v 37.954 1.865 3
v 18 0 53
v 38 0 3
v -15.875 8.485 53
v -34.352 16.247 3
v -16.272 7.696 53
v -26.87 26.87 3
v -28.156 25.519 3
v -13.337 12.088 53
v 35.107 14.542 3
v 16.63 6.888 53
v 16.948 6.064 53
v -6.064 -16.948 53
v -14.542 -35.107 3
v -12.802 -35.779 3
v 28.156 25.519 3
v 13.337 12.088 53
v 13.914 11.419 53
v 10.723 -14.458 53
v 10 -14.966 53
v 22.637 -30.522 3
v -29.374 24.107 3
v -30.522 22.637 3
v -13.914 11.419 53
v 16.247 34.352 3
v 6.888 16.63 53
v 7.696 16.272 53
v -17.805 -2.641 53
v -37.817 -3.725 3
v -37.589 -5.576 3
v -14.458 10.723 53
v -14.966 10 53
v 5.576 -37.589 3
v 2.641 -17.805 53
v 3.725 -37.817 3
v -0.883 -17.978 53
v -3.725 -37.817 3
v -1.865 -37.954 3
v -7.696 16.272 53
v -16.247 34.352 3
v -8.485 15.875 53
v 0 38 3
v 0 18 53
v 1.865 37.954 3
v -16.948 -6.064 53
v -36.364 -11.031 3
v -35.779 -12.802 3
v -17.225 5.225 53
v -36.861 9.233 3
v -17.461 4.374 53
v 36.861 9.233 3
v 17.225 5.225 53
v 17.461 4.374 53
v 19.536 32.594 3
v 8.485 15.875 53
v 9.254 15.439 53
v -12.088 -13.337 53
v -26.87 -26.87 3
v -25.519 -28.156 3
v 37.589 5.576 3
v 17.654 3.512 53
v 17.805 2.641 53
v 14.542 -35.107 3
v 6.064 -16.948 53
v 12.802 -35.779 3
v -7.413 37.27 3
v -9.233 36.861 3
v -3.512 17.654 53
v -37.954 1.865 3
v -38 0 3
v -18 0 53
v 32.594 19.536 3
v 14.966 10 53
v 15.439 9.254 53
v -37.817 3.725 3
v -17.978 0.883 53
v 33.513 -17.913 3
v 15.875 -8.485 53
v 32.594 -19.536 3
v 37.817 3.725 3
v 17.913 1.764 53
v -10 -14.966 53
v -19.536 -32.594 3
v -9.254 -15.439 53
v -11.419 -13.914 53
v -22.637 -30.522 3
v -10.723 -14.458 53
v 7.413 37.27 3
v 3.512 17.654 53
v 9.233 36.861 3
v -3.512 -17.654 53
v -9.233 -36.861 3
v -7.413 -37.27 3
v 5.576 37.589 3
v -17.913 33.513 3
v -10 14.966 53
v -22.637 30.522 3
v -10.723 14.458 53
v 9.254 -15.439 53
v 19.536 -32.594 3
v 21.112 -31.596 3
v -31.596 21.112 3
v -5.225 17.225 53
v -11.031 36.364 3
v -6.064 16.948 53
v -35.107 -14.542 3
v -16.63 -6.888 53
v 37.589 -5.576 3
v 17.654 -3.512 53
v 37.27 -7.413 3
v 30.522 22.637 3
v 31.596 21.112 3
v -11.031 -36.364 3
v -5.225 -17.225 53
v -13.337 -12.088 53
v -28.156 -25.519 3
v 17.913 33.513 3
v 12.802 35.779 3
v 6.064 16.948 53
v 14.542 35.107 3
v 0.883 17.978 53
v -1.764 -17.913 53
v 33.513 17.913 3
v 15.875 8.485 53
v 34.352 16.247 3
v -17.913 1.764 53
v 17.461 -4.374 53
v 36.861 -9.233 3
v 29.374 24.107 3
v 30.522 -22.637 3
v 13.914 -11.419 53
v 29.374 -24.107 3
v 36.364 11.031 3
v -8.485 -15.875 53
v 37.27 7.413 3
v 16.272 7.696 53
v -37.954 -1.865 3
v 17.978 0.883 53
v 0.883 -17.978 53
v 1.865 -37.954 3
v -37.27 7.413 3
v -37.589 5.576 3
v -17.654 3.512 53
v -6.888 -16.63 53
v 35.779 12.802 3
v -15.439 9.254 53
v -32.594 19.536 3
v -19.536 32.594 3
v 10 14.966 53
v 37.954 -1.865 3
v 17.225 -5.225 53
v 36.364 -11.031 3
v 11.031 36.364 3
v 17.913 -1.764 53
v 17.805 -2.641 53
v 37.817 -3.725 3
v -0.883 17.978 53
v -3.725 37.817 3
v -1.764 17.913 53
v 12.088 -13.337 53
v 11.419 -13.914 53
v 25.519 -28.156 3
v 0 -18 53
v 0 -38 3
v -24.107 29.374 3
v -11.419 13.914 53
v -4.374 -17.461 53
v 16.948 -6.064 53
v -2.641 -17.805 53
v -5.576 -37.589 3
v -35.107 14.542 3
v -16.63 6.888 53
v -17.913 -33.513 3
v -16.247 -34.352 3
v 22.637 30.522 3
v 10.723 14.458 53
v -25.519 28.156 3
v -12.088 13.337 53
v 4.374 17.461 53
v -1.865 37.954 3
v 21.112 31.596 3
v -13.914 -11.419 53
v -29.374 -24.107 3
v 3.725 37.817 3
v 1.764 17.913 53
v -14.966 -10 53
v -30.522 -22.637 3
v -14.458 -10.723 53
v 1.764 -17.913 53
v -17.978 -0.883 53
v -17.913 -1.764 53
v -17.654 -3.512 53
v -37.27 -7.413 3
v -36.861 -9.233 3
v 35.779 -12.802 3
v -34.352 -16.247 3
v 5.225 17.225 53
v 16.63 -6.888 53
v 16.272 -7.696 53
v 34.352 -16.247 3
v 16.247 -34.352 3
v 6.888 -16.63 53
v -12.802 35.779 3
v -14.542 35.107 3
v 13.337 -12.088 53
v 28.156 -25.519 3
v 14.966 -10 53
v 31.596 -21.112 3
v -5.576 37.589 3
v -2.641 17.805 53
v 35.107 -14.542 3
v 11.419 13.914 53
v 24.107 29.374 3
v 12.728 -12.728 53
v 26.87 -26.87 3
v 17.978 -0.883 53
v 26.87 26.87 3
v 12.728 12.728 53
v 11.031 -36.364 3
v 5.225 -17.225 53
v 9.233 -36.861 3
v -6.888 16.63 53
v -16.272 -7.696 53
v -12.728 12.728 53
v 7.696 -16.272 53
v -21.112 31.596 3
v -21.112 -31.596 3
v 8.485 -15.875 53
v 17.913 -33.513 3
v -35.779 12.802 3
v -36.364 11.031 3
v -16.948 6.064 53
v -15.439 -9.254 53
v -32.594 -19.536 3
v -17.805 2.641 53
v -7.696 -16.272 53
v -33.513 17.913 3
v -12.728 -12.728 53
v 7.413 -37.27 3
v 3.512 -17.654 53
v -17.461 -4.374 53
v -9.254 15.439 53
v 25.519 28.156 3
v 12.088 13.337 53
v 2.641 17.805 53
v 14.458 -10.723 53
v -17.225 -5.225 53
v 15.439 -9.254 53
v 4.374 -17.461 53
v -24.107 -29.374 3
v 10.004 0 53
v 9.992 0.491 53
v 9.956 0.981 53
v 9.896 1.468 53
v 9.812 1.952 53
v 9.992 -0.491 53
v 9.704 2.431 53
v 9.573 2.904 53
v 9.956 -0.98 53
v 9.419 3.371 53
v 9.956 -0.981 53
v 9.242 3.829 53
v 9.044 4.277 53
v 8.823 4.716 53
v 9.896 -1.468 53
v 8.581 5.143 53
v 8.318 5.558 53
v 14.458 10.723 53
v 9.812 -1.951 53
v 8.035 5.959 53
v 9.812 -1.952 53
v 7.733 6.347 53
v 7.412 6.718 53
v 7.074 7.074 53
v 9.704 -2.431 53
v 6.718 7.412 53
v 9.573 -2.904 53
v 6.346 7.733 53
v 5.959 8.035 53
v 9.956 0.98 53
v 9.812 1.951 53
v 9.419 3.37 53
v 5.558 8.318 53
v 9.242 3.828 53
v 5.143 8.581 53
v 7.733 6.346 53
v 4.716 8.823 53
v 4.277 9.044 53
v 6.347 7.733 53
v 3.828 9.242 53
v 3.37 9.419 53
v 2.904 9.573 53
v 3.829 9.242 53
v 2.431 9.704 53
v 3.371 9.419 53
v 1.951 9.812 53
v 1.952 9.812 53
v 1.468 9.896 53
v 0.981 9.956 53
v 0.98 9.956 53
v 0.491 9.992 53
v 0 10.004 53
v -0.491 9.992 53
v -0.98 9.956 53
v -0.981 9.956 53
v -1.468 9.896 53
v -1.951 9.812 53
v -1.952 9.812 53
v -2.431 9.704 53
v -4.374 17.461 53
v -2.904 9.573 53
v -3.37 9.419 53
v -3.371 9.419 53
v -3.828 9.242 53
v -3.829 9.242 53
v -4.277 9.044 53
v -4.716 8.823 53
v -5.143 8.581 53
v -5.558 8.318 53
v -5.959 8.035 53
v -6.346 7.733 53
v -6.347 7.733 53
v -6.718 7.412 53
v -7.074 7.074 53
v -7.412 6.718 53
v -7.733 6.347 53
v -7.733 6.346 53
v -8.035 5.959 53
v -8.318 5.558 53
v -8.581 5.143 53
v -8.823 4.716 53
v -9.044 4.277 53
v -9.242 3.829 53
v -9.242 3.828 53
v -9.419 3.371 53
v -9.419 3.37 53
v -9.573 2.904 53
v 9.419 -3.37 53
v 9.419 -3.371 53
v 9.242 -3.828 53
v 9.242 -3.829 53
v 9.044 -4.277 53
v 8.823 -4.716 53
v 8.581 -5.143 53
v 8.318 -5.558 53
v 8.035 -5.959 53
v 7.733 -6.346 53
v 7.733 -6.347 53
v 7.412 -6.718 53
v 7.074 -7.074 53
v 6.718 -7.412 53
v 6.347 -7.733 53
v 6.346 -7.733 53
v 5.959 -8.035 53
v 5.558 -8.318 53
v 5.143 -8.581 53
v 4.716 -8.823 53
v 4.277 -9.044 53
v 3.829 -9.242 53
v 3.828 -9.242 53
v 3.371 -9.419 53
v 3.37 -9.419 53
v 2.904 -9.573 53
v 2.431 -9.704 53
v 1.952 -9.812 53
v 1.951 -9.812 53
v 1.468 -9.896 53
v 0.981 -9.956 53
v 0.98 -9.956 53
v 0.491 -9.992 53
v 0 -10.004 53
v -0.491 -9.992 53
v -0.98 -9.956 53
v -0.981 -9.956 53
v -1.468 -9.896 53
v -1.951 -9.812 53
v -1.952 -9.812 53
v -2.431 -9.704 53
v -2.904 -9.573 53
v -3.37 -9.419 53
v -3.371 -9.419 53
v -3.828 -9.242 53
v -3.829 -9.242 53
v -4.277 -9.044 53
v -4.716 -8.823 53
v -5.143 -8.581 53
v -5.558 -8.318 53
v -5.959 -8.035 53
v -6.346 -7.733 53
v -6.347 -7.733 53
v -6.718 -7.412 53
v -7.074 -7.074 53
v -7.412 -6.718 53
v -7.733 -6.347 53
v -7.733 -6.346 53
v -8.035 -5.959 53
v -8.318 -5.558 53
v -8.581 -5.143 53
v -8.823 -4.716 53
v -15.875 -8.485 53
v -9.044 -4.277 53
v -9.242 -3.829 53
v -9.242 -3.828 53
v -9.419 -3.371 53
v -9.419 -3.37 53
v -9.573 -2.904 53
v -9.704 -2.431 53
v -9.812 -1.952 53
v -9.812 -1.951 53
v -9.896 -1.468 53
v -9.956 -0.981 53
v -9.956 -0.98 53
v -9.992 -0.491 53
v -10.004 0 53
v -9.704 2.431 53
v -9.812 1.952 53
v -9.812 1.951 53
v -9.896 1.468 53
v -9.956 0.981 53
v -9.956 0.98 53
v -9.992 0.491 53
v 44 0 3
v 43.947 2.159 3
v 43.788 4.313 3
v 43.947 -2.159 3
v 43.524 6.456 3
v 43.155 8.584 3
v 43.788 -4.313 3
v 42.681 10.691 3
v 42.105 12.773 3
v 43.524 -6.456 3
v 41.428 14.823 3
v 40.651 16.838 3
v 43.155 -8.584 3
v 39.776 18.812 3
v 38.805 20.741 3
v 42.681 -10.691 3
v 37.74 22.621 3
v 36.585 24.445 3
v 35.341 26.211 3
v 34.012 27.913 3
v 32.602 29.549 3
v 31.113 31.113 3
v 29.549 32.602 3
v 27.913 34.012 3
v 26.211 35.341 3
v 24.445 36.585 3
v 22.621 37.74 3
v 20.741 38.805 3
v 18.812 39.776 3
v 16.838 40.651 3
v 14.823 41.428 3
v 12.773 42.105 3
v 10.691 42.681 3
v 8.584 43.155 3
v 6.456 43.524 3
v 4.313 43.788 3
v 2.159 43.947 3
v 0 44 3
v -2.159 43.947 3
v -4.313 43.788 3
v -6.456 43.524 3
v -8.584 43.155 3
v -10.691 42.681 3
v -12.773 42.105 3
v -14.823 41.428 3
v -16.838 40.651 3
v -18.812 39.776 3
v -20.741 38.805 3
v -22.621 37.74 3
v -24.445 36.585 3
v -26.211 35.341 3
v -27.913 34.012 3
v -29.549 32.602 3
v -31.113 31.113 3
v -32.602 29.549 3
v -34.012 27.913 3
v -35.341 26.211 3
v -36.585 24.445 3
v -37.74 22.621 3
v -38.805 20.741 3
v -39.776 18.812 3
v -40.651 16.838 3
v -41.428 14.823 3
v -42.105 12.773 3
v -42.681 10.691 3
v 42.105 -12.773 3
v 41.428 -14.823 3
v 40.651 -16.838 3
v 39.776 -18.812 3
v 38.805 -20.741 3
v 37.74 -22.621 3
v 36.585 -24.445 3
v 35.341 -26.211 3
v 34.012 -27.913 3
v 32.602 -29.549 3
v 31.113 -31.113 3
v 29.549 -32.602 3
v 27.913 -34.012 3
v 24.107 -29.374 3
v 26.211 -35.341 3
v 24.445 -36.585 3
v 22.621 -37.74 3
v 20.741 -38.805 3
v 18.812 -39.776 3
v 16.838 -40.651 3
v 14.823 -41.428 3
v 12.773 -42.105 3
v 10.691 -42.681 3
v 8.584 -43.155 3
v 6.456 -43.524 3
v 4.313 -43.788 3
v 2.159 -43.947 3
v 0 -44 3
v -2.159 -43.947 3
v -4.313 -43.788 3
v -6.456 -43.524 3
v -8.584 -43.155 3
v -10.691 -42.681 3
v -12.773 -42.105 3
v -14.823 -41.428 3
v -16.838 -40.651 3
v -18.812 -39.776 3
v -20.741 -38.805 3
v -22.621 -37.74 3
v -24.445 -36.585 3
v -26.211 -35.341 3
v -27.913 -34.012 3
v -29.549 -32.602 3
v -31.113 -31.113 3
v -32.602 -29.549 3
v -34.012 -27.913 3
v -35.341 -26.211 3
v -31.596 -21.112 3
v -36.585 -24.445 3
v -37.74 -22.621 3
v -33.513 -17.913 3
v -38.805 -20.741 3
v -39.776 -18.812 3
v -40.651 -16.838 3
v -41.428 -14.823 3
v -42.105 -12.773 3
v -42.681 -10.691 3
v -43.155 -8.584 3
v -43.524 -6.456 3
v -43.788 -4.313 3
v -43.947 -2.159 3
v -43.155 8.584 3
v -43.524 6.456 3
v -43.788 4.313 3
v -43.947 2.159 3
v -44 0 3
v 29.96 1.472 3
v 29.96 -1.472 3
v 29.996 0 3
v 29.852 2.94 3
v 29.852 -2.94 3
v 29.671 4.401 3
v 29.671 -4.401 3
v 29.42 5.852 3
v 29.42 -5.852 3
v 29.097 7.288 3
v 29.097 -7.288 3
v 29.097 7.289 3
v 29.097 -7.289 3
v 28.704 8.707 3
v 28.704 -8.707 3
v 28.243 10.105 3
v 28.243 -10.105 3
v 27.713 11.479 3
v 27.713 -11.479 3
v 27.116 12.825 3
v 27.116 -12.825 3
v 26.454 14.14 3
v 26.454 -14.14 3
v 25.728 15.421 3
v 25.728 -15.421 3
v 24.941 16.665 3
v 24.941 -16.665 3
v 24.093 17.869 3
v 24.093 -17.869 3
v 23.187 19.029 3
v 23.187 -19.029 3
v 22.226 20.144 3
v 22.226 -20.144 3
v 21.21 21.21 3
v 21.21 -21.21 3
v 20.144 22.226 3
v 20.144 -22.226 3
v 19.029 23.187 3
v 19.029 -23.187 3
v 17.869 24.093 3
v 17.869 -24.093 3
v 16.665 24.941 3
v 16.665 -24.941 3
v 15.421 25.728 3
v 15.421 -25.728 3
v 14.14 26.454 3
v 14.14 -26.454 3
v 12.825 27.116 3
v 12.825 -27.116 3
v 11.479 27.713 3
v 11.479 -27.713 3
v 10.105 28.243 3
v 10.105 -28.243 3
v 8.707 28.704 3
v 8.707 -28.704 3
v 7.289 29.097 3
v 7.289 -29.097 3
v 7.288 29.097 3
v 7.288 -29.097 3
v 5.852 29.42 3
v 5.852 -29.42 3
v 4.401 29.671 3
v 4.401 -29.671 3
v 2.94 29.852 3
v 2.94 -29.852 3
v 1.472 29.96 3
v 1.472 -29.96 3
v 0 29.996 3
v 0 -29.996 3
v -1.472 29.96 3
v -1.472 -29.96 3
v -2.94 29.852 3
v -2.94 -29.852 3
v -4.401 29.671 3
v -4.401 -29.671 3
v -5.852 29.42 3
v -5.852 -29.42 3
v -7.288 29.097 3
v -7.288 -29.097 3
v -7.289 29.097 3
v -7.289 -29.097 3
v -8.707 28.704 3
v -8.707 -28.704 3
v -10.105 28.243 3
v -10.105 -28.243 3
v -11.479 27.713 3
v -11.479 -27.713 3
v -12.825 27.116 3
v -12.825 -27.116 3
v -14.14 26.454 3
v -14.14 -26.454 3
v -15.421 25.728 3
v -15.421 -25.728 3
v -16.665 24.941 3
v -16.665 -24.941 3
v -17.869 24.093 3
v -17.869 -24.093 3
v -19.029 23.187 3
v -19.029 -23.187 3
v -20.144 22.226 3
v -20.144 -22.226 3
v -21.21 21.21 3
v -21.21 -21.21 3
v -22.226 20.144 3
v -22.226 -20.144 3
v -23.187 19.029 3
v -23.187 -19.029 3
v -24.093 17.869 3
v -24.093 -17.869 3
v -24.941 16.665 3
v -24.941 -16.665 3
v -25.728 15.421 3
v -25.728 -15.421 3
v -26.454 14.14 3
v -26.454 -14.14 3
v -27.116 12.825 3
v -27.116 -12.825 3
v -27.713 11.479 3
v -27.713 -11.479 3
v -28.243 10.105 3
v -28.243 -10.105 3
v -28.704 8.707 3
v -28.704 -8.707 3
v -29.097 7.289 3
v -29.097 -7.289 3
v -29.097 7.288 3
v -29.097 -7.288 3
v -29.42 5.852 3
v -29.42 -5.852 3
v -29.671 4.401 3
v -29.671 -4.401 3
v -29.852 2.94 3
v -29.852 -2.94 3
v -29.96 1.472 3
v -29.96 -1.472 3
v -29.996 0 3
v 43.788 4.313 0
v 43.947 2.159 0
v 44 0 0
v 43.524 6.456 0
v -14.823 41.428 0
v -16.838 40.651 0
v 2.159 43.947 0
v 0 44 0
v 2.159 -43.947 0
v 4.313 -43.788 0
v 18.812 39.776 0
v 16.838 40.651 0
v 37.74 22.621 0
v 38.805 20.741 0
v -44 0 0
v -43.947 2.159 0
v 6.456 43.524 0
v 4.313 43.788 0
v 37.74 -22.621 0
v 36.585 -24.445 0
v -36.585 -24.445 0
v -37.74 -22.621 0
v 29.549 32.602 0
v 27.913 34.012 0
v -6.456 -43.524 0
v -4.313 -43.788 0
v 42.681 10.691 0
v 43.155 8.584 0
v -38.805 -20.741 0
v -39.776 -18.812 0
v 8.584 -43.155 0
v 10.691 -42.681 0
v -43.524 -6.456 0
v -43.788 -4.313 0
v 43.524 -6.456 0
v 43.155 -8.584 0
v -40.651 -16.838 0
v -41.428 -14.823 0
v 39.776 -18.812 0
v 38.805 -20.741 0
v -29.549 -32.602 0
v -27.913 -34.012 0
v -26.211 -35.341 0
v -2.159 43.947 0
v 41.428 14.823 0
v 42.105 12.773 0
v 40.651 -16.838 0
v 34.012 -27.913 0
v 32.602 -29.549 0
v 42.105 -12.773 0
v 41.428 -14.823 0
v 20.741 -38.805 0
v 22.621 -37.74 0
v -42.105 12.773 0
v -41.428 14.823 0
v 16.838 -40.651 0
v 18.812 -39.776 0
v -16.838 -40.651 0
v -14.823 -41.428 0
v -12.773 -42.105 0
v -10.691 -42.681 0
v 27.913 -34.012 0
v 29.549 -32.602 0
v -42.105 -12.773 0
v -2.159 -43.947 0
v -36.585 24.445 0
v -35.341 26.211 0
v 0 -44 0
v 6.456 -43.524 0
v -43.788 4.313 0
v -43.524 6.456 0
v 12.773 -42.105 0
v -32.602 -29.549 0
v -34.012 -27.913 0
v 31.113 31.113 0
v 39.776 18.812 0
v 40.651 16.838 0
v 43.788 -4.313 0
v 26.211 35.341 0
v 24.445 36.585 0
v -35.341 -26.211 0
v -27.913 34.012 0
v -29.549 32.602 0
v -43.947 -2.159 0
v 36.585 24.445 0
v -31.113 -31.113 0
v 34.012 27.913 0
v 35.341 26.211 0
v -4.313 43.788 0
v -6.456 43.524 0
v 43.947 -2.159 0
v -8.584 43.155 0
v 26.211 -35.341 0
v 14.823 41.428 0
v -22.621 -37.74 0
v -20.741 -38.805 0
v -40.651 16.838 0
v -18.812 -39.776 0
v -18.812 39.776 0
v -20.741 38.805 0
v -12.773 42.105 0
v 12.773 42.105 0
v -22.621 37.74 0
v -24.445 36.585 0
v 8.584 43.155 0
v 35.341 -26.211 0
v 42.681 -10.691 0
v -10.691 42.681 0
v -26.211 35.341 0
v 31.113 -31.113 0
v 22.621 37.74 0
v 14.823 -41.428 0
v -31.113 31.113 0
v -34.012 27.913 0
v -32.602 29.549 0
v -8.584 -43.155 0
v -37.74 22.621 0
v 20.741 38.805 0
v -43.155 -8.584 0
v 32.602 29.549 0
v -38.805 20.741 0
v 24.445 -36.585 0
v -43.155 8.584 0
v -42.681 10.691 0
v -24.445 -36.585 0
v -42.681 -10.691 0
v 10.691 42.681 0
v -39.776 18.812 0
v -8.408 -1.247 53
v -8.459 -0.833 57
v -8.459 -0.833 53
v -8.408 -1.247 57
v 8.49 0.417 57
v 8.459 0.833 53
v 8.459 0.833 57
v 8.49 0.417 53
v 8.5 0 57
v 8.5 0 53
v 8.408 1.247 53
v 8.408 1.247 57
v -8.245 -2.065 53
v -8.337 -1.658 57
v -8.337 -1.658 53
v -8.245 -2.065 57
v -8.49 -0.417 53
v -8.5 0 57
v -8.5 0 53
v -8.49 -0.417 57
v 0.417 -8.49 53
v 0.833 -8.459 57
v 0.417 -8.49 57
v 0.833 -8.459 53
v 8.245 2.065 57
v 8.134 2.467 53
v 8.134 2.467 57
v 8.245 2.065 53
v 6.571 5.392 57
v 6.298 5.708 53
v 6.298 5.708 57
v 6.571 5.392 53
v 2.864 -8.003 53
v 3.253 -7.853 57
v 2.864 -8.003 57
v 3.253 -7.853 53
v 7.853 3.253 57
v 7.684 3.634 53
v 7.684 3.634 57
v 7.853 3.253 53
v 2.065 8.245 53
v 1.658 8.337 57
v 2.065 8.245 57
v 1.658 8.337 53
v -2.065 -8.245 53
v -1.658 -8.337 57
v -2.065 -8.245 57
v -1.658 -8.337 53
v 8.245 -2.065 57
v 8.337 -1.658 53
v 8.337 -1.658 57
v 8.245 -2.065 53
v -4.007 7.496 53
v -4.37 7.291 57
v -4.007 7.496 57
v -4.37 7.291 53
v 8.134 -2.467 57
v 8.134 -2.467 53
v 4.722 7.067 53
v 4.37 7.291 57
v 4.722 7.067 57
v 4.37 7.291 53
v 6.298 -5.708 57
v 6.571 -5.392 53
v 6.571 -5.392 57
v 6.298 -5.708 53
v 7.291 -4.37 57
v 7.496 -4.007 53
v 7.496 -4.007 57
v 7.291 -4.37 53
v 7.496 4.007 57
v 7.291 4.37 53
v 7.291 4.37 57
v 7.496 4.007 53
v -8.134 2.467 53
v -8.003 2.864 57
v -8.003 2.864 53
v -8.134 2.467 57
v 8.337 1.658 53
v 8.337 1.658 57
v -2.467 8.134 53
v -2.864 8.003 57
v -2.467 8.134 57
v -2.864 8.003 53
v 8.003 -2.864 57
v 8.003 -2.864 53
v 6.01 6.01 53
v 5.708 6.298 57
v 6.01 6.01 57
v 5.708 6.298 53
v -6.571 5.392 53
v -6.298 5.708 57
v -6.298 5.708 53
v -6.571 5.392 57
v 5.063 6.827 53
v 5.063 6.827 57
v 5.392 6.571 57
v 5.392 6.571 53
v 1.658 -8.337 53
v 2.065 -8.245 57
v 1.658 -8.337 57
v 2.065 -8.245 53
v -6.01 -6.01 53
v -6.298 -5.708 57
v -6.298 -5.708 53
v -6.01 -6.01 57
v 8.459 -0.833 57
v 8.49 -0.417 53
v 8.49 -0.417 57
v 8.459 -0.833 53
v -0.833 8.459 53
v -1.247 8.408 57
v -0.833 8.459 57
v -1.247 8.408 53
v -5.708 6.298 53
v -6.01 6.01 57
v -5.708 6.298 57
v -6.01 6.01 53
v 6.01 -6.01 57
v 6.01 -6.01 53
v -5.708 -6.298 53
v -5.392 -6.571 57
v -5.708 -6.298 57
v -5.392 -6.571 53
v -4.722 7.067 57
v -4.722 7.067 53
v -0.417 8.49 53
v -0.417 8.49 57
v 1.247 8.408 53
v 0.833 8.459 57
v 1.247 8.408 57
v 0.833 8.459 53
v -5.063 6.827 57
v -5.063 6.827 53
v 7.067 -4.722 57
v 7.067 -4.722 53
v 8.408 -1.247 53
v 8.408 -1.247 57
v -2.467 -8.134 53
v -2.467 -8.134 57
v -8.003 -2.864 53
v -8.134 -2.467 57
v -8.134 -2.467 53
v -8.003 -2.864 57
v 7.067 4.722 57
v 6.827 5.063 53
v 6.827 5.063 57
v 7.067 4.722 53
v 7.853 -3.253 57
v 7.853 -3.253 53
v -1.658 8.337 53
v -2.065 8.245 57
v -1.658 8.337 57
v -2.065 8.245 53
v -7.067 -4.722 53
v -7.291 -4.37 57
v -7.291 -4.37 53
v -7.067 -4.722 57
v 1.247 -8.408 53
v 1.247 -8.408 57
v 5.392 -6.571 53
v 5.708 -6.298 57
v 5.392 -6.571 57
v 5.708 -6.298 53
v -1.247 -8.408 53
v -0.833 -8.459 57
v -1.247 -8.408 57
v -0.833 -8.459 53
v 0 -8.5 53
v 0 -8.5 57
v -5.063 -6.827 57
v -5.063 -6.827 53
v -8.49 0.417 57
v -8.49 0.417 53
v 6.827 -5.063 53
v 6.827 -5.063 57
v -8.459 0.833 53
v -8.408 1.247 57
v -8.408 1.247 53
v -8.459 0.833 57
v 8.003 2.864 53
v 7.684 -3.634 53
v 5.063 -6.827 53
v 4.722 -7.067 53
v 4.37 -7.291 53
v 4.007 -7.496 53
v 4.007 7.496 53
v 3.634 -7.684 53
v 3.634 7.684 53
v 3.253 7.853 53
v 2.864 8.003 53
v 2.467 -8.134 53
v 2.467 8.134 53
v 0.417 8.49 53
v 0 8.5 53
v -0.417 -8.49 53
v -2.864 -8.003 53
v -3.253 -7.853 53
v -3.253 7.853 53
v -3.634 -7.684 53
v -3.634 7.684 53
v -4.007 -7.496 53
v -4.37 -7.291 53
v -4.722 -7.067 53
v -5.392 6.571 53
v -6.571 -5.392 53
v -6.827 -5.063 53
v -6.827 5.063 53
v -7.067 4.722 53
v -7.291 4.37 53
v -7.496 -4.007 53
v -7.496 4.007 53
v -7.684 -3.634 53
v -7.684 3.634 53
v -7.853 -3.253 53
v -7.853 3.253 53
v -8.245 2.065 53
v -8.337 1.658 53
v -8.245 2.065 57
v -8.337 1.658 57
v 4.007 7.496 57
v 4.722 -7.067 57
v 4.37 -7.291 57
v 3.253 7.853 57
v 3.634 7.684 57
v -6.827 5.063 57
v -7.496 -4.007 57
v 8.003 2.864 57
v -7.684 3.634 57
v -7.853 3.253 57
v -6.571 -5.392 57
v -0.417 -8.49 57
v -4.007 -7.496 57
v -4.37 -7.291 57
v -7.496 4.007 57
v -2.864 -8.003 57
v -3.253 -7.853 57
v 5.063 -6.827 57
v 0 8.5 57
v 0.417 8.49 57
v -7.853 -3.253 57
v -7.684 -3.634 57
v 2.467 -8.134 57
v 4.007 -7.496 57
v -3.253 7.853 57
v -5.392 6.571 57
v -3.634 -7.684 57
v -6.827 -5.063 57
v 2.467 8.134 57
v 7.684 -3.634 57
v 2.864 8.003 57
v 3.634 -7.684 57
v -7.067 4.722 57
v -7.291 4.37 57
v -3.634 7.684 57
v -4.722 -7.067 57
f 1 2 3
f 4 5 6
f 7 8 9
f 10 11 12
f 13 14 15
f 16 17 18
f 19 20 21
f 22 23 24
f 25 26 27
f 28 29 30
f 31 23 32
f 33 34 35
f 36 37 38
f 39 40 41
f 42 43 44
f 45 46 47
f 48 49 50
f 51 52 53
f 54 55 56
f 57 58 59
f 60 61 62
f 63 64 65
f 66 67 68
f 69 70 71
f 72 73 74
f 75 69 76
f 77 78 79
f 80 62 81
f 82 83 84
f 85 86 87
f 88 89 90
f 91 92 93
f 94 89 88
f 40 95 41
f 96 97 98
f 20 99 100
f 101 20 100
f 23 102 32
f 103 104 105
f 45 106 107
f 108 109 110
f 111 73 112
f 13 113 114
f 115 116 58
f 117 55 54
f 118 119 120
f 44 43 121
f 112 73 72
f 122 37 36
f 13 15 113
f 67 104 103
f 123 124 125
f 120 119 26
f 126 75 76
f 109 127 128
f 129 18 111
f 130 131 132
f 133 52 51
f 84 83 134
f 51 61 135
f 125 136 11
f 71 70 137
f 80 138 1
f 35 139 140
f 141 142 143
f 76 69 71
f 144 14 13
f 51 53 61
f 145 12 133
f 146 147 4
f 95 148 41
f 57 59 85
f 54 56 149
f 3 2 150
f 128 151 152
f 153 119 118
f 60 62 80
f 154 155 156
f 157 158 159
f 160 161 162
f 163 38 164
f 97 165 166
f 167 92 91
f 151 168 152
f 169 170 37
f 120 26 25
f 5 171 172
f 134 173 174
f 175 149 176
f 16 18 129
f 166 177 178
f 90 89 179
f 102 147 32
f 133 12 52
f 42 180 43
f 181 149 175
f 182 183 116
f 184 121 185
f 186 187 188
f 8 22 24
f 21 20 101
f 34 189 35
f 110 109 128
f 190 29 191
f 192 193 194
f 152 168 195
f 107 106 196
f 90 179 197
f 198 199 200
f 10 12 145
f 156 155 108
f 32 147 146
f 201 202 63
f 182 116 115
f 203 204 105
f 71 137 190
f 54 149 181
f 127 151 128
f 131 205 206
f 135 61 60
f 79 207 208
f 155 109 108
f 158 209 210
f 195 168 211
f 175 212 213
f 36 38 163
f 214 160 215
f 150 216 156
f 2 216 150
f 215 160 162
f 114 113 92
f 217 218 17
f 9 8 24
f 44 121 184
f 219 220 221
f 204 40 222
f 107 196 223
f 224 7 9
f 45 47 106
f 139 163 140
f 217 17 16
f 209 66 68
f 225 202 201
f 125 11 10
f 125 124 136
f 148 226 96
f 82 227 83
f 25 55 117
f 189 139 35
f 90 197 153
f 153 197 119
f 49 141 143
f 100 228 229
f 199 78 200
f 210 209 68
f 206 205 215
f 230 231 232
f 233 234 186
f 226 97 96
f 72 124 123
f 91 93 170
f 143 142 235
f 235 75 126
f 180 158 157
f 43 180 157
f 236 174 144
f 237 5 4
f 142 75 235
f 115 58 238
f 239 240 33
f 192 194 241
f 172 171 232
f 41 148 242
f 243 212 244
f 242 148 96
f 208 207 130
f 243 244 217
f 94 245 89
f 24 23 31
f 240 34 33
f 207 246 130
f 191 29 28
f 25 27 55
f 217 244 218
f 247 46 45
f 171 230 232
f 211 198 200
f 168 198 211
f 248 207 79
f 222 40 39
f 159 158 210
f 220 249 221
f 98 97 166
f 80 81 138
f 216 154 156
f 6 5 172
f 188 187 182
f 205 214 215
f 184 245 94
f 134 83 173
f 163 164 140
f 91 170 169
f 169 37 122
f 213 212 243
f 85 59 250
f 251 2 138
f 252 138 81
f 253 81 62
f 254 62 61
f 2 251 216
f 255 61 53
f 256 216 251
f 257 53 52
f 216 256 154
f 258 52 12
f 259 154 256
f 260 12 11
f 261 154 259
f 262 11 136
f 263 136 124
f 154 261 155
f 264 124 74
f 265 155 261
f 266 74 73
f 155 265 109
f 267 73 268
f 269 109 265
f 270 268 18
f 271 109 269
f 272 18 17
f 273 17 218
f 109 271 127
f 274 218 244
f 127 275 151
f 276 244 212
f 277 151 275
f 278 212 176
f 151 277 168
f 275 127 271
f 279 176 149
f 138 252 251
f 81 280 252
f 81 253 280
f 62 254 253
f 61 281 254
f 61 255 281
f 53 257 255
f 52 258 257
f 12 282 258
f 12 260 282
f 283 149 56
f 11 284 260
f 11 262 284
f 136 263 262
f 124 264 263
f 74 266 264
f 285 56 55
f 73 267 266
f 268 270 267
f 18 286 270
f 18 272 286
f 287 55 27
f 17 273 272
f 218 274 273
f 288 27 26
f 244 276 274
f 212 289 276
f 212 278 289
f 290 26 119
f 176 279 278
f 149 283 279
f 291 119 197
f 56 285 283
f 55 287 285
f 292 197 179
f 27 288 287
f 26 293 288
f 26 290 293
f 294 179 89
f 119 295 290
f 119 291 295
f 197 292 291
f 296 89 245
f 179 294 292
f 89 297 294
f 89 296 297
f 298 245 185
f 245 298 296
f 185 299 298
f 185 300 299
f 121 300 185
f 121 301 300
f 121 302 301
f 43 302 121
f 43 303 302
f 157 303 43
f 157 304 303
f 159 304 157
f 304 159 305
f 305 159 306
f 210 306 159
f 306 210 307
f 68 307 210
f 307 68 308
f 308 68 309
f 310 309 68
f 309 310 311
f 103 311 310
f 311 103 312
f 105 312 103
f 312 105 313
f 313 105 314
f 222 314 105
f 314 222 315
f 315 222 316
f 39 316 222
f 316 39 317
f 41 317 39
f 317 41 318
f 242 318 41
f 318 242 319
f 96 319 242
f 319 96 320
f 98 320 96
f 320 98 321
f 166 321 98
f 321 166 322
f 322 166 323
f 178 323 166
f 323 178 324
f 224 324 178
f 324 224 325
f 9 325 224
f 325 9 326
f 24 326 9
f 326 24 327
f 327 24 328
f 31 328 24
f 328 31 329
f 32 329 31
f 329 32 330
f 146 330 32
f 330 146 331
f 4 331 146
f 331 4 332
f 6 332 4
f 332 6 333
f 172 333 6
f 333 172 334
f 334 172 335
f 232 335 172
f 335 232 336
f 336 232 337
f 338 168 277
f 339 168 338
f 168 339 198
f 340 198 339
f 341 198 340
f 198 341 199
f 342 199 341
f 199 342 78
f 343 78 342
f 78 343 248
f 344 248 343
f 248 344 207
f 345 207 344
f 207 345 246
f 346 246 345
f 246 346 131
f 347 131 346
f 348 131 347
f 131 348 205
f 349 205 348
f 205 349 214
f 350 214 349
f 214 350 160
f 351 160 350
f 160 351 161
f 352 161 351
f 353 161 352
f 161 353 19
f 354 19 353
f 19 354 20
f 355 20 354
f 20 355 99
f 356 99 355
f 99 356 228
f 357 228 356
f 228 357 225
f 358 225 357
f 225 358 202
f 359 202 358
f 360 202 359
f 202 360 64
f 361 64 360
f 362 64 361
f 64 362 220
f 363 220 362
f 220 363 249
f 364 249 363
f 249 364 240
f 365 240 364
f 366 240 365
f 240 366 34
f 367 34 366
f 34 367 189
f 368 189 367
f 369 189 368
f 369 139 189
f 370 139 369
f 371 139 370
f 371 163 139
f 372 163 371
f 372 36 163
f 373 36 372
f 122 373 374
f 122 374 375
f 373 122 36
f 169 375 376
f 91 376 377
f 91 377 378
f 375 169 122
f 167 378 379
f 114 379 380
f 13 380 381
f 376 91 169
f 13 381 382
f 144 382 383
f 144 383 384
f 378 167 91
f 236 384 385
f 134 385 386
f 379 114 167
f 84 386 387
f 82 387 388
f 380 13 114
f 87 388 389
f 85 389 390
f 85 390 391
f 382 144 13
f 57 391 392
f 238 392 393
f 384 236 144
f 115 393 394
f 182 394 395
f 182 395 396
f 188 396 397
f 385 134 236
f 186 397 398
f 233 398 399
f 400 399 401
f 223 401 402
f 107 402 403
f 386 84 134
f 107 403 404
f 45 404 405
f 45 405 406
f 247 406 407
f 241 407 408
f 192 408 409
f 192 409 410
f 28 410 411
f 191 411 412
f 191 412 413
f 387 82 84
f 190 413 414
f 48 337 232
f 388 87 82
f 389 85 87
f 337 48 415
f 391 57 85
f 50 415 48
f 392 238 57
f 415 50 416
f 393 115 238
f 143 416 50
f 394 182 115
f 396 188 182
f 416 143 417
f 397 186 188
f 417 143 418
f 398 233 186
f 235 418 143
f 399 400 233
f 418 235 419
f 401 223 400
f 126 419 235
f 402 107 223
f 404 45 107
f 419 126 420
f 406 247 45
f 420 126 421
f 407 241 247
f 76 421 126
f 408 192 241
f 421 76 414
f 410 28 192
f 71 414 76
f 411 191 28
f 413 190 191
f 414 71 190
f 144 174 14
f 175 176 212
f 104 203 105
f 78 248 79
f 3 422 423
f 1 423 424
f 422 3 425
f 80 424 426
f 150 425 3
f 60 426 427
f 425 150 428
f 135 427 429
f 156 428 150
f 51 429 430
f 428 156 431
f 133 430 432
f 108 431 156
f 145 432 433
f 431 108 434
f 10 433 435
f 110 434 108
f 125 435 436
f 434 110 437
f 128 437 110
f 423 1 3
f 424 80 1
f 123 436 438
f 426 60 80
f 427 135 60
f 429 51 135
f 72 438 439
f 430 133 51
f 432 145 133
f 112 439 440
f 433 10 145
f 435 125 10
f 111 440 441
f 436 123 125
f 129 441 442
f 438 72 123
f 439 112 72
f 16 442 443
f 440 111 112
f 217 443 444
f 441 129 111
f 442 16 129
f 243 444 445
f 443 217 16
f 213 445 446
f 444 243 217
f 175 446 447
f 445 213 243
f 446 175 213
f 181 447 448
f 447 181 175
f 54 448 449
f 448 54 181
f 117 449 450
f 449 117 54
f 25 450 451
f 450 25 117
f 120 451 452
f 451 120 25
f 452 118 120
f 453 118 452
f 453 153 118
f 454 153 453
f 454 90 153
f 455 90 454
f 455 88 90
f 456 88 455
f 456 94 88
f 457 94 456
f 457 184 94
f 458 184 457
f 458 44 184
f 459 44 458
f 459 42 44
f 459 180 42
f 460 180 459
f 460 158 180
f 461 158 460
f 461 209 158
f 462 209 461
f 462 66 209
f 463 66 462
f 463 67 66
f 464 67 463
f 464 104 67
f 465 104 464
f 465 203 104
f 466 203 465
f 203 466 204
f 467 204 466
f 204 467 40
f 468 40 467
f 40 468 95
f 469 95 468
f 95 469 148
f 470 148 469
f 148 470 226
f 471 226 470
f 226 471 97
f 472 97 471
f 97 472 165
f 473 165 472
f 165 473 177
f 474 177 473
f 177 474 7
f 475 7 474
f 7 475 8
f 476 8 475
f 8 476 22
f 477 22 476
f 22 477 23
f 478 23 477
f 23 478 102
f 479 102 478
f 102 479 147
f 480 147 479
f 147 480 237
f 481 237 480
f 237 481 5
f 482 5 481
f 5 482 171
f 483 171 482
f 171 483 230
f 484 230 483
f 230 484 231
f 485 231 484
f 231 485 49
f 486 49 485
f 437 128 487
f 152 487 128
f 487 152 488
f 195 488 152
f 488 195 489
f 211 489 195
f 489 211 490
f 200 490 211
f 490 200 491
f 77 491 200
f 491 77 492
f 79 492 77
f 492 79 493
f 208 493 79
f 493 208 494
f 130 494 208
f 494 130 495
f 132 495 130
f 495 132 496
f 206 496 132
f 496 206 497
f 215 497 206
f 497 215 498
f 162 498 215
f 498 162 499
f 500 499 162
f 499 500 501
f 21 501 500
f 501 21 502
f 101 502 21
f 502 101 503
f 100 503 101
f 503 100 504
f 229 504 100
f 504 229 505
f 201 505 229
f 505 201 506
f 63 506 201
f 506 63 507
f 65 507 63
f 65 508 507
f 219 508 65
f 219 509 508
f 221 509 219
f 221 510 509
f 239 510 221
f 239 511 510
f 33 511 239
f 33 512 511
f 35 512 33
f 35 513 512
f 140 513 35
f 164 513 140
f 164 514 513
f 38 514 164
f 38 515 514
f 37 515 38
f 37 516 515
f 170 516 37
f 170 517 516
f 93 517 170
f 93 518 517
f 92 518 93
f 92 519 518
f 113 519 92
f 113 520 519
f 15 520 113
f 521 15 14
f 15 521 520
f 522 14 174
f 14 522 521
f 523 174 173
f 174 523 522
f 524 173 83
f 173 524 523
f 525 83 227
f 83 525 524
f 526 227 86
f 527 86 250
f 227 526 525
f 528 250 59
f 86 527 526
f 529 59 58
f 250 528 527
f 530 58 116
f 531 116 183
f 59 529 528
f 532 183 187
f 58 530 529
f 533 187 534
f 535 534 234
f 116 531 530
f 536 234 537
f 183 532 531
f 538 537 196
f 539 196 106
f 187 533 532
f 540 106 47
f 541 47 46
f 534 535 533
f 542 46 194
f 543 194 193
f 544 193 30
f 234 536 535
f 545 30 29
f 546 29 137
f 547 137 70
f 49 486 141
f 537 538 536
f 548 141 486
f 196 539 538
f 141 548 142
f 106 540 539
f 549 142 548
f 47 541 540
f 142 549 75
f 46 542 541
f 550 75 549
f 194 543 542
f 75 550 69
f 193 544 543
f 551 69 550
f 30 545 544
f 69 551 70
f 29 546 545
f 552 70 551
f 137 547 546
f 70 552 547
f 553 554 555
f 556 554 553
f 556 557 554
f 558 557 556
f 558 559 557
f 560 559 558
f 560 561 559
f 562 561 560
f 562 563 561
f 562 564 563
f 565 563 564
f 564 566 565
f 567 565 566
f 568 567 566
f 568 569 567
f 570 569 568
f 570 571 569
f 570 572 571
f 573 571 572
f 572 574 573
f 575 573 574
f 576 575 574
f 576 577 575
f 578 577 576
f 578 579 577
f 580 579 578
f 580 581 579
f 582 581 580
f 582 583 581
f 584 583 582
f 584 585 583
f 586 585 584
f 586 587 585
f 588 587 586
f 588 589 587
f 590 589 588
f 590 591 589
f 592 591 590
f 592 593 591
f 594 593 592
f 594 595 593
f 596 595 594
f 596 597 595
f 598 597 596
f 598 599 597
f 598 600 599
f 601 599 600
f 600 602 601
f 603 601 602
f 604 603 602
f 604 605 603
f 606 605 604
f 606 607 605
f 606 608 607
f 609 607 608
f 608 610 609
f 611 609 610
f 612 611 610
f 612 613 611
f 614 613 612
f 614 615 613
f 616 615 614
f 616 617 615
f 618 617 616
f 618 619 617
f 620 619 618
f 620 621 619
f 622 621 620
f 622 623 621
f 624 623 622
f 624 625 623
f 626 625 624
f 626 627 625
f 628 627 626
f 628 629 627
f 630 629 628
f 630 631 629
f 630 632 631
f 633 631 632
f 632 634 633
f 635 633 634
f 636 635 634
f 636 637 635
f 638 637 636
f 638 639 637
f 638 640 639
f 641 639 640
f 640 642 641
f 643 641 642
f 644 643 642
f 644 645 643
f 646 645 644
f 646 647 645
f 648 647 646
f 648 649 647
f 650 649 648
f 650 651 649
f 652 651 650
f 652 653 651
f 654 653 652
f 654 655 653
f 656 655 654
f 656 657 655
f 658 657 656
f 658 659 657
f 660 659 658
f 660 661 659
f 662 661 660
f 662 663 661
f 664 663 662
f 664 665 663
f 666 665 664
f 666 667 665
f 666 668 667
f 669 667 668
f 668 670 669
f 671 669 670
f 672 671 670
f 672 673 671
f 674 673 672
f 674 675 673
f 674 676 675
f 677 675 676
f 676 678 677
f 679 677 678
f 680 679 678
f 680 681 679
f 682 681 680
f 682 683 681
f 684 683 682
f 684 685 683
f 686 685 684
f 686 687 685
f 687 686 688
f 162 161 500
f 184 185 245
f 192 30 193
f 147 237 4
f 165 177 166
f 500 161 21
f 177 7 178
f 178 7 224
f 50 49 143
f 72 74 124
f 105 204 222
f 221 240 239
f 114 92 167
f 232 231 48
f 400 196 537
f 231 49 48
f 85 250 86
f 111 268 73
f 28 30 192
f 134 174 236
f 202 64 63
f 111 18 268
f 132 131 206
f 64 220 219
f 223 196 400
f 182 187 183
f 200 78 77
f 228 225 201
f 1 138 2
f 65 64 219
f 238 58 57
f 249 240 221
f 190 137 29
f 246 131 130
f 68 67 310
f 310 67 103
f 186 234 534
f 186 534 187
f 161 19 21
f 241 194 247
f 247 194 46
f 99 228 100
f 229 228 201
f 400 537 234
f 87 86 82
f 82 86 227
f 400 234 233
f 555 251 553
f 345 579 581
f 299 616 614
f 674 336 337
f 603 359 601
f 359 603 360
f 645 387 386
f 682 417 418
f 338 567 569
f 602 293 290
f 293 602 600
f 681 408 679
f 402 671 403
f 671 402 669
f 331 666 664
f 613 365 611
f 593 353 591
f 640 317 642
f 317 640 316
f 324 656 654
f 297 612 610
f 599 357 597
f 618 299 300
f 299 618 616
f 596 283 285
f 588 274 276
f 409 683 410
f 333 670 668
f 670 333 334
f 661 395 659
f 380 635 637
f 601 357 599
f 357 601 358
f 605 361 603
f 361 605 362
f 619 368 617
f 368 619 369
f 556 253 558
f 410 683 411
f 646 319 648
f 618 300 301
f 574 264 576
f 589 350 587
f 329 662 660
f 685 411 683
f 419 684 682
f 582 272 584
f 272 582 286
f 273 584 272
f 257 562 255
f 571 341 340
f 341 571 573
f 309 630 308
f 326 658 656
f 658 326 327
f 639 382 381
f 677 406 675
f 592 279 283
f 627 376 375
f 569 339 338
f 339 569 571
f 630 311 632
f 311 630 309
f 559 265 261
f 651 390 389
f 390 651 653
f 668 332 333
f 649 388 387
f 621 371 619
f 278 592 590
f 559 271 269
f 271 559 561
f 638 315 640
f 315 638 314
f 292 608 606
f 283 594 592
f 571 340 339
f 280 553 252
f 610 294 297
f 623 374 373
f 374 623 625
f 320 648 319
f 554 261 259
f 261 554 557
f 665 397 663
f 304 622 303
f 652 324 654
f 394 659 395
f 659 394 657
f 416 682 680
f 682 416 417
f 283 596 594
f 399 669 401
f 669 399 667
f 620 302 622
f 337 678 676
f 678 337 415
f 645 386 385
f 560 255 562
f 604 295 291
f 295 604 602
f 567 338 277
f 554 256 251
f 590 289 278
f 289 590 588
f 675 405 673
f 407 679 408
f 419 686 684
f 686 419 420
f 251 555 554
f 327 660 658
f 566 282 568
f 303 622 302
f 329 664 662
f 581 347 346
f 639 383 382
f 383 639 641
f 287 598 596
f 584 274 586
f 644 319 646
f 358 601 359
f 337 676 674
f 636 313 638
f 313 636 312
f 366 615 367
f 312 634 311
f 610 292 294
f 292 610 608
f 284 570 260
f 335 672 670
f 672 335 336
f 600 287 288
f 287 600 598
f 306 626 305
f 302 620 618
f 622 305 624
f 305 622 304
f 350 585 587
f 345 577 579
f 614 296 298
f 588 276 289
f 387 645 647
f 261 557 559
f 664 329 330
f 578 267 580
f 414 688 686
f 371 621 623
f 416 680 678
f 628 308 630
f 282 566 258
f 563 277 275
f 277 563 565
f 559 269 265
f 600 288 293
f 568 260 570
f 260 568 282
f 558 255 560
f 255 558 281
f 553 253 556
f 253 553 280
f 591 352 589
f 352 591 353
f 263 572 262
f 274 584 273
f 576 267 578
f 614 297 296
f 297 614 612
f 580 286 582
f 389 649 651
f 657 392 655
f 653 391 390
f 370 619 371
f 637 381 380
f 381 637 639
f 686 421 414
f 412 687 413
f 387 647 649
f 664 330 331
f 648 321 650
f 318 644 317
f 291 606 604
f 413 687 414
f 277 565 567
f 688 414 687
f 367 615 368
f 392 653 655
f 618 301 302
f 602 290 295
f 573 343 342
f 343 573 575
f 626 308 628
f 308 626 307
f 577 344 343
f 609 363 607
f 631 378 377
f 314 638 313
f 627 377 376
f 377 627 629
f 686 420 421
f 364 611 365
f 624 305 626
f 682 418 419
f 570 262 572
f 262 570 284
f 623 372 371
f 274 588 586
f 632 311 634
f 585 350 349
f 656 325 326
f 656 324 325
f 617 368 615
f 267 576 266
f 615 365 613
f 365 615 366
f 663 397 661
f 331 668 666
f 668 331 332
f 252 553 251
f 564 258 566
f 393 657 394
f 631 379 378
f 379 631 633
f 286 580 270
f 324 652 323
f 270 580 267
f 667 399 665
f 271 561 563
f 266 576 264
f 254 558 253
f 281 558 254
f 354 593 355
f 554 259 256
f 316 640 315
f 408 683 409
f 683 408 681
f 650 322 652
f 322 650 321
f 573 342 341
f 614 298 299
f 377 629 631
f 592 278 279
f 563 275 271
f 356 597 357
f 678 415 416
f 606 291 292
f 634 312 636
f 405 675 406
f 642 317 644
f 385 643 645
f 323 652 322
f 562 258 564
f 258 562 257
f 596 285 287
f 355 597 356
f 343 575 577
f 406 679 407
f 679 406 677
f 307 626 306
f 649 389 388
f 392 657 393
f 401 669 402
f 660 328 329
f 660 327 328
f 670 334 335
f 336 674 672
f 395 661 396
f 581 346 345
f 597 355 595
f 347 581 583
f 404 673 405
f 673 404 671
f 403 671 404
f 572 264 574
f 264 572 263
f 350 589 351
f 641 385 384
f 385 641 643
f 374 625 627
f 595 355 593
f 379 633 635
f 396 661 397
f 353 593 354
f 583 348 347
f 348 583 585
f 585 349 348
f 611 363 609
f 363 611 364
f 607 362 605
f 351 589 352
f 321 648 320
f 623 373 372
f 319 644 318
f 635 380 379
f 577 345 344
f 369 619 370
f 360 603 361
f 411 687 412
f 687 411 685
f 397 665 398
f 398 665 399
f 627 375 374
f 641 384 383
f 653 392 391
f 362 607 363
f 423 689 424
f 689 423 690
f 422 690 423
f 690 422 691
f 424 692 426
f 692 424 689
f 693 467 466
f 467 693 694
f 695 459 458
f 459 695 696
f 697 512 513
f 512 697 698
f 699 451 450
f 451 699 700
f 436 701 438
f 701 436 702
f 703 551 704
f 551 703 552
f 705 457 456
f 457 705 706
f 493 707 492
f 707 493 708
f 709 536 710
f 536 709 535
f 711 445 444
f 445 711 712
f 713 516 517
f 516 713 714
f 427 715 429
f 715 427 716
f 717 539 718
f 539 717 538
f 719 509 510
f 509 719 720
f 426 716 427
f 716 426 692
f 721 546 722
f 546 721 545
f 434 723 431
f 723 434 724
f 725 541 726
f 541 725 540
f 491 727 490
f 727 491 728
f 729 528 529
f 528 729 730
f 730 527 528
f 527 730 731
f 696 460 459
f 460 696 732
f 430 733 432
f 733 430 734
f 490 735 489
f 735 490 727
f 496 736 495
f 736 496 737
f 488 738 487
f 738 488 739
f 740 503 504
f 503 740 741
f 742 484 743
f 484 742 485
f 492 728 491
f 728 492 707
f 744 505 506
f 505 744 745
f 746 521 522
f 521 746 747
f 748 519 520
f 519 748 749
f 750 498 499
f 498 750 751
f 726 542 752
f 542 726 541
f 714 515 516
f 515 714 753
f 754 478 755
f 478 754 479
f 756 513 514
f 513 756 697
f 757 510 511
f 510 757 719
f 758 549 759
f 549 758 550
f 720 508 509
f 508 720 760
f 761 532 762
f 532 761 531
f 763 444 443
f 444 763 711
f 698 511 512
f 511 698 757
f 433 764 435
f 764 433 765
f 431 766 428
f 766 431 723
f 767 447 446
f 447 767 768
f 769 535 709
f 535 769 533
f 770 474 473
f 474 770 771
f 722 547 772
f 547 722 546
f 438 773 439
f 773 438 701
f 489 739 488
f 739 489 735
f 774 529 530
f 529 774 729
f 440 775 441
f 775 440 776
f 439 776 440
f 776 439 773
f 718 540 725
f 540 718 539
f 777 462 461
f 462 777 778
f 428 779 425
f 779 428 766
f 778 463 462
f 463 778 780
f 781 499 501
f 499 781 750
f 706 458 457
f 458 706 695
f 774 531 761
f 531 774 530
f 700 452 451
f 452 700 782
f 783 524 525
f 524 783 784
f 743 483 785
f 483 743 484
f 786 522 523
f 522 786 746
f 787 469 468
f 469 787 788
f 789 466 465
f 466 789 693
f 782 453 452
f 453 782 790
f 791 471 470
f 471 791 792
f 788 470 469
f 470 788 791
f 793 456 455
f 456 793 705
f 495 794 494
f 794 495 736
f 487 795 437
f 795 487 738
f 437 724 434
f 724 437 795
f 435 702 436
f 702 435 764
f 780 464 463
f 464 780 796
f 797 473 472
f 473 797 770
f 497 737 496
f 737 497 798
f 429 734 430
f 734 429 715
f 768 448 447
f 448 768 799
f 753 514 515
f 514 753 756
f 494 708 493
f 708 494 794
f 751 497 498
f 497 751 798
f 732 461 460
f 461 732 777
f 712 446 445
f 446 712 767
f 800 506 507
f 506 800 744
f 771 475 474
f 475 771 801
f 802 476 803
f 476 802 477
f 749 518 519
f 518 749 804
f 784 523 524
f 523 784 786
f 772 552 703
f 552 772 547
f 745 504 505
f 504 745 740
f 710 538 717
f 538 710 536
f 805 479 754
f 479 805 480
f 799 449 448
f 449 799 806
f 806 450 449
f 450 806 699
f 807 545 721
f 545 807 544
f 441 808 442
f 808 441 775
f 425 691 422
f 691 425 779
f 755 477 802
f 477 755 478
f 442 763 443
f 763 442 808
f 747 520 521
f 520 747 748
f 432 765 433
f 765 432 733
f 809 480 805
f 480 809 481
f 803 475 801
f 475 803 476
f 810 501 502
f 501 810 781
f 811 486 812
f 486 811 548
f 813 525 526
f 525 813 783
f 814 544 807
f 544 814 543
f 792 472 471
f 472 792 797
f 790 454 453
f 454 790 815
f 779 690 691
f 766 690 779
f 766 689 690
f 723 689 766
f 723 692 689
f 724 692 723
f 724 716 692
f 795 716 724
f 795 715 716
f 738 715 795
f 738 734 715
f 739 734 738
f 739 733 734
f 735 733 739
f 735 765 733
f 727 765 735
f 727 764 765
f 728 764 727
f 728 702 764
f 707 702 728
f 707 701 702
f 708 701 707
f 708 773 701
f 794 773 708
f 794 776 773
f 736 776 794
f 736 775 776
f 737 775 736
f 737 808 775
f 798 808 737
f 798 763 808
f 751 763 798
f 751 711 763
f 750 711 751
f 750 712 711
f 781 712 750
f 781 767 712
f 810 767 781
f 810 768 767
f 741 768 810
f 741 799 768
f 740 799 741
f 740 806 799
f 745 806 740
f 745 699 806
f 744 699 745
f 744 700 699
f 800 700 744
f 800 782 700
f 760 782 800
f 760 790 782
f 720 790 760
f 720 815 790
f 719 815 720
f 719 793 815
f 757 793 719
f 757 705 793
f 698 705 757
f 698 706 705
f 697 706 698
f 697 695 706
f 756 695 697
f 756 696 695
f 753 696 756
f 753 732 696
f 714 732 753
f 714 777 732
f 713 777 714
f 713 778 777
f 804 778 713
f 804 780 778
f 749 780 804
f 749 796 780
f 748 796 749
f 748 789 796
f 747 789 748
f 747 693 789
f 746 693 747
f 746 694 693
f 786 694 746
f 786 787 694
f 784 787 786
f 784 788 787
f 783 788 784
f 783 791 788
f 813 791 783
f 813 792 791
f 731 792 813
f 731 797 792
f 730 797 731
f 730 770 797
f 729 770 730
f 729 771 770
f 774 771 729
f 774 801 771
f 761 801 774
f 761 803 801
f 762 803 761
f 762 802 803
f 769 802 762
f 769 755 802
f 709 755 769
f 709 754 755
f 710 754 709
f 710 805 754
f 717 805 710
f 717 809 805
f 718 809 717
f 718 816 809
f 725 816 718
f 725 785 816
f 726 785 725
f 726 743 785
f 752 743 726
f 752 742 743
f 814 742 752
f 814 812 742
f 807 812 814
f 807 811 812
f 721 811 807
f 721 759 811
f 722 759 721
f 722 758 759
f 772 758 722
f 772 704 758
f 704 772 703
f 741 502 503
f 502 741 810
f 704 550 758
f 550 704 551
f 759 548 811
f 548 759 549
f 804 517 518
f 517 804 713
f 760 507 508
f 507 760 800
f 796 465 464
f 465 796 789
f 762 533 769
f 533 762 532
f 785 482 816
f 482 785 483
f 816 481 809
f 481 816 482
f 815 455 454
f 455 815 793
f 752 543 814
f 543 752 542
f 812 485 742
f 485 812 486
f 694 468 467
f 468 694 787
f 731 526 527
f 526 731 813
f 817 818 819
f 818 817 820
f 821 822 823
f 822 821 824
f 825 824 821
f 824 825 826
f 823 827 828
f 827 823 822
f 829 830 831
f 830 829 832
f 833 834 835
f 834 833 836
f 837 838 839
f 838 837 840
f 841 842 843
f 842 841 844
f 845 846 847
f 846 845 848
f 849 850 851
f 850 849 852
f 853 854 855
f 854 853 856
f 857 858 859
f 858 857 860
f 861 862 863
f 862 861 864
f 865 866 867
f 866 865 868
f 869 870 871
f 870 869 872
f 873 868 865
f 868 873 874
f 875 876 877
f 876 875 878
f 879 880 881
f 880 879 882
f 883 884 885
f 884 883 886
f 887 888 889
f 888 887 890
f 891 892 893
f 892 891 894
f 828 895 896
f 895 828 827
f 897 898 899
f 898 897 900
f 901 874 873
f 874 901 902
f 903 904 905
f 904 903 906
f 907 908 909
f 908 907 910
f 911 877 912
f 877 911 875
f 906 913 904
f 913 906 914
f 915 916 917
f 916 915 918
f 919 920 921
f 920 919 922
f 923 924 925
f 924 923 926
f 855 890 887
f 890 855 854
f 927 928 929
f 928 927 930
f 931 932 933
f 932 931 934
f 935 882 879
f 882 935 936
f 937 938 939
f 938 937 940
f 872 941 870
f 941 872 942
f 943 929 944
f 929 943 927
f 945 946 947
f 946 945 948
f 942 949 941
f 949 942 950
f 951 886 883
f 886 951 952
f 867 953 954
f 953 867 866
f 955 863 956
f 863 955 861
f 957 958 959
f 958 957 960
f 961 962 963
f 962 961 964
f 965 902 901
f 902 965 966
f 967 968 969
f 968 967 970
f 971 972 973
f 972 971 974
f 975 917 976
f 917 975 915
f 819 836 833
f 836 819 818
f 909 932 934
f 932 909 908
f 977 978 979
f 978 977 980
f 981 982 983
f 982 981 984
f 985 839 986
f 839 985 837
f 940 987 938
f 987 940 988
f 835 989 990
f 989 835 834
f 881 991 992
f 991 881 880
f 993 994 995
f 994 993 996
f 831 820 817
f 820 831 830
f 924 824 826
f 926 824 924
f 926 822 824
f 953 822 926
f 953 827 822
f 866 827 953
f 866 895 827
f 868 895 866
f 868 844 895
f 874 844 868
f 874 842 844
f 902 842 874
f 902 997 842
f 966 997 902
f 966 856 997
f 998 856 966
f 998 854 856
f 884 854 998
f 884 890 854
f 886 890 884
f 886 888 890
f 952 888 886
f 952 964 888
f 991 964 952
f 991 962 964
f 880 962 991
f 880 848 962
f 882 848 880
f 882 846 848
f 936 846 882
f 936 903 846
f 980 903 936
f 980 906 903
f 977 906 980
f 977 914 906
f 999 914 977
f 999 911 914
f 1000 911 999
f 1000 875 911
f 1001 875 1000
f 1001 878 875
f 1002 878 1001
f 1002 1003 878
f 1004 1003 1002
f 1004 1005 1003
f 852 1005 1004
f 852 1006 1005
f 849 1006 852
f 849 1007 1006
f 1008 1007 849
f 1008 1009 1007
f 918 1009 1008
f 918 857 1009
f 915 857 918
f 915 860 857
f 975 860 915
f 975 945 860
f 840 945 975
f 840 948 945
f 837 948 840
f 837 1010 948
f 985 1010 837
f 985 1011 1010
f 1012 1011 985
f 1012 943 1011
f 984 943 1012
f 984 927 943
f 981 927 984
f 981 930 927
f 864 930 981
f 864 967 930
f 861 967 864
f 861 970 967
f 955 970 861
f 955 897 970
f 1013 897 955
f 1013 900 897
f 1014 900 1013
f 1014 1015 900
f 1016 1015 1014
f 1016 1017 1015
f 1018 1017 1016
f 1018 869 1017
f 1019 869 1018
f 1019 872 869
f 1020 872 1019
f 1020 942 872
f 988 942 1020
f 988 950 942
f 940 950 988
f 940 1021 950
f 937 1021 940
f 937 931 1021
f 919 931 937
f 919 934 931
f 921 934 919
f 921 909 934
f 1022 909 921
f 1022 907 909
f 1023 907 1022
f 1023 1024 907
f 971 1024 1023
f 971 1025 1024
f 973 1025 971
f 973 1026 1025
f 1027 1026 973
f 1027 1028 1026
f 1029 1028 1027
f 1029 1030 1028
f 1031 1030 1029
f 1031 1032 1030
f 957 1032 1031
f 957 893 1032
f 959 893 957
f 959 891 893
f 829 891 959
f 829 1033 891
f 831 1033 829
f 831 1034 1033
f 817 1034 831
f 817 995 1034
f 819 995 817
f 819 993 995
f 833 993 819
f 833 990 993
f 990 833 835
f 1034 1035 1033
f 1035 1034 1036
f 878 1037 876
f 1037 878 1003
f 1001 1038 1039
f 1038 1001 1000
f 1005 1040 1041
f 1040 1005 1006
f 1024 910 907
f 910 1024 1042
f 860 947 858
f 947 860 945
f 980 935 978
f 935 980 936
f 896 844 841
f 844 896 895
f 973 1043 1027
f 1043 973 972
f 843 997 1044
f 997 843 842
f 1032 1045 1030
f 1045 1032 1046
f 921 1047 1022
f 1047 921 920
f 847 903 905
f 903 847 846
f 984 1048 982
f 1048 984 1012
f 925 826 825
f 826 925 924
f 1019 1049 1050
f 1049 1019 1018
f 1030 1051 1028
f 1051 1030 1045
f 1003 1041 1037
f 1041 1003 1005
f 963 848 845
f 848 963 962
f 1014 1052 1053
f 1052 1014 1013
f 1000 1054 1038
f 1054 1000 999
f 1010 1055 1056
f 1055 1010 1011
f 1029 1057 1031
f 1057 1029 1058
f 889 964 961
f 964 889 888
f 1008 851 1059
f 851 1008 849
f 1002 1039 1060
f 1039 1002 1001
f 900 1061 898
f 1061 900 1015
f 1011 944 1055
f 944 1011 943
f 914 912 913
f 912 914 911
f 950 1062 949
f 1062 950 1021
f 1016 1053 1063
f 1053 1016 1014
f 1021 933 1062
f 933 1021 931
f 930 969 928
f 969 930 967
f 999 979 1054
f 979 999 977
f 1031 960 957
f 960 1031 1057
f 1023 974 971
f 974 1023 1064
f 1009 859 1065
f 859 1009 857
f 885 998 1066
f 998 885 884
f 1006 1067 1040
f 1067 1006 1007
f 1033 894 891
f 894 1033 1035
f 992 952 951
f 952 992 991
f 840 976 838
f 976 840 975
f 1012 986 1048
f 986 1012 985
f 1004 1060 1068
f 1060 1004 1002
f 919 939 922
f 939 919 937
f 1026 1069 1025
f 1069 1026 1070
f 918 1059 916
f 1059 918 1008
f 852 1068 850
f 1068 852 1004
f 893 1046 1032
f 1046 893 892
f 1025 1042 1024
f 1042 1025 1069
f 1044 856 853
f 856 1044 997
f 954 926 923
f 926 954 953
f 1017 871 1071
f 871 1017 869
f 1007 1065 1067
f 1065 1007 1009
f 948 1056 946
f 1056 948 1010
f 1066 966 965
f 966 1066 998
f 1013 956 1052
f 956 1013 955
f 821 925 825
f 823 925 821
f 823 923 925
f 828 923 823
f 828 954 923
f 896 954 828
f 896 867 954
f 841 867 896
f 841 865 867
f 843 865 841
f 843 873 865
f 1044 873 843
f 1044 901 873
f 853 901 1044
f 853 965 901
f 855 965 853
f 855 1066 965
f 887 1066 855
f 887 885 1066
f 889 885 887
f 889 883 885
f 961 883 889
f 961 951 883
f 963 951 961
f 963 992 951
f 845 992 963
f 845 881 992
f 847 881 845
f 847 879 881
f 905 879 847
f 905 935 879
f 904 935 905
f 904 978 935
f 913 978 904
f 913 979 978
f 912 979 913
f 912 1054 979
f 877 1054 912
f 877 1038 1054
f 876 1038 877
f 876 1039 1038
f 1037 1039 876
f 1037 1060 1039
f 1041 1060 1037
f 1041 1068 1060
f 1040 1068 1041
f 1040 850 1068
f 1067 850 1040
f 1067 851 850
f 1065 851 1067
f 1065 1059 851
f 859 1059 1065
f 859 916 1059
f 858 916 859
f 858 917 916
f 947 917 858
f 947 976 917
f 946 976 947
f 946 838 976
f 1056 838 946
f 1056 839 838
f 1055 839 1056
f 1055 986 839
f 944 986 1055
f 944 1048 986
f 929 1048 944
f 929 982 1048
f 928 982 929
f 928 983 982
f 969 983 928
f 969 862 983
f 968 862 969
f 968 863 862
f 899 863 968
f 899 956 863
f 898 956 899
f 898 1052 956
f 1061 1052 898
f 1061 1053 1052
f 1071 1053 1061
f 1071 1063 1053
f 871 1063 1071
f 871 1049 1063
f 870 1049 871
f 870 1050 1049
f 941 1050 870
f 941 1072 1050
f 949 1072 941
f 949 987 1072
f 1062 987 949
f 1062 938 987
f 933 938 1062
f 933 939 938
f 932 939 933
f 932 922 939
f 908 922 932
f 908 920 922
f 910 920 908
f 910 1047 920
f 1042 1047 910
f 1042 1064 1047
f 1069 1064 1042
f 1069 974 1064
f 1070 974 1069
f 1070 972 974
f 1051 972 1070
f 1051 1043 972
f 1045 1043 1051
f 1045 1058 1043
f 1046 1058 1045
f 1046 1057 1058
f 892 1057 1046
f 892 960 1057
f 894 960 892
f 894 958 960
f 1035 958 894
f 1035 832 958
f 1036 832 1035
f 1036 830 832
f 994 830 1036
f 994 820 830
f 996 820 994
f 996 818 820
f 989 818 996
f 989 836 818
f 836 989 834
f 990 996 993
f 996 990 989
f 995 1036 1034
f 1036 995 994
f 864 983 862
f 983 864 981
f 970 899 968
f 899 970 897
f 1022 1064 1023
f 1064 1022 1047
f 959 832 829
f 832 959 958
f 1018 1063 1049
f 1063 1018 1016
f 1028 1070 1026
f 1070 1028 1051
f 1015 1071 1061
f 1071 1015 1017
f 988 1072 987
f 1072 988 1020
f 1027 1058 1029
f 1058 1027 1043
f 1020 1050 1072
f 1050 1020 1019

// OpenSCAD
// ============================================================
//  PIECE 1 — Tapered Hollow Pedestal
//  Sonos Era 100 Isolation Stand
//  Material: PETG — 240°C nozzle, 75°C bed
//  Print upright, no supports needed
// ============================================================

$fn = 128;

// ── Spring interface dimensions (from STL analysis) ──────────
SPRING_HUB_R     = 8.7;    // scaled hub radius (fits into spring centre)
PIN_R            = SPRING_HUB_R - 0.2;  // 0.2mm press-fit clearance
PIN_H            = 4.0;    // pin height that inserts into spring hub

// ── Pedestal body ─────────────────────────────────────────────
PED_H            = 50.0;   // 5cm tall
PED_R_TOP        = 18.0;   // narrow top (near spring)
PED_R_BOT        = 38.0;   // wide base
WALL             = 8.0;    // 8mm thick walls (hollow cone)

// ── Base disc ─────────────────────────────────────────────────
BASE_R           = PED_R_BOT + 6.0;  // slightly wider than cone base
BASE_H           = 3.0;

// ── Assembly ──────────────────────────────────────────────────
union() {

    // 1. Base disc — sits on shelf
    cylinder(r=BASE_R, h=BASE_H);

    // 2. Hollow tapered cone
    //    Outer cone minus inner (offset by WALL)
    difference() {
        // Outer cone
        translate([0, 0, BASE_H])
            cylinder(r1=PED_R_BOT, r2=PED_R_TOP, h=PED_H);

        // Inner hollow — same taper, wall inset by WALL
        translate([0, 0, BASE_H - 0.01])
            cylinder(
                r1 = PED_R_BOT - WALL,
                r2 = max(PED_R_TOP - WALL, 2.0),
                h  = PED_H + 0.02
            );
    }

    // 3. Press-fit pin at top — inserts into spring centre hub
    translate([0, 0, BASE_H + PED_H])
        cylinder(r=PIN_R, h=PIN_H);
}

// ── PRINT NOTES ───────────────────────────────────────────────
// Orientation : upright (base on build plate)
// Supports    : none needed
// Infill      : 20% gyroid for base disc, walls are solid by geometry
// PETG        : 240°C / 75°C bed / 3 perimeters
// After print : press pin up into spring centre hub
